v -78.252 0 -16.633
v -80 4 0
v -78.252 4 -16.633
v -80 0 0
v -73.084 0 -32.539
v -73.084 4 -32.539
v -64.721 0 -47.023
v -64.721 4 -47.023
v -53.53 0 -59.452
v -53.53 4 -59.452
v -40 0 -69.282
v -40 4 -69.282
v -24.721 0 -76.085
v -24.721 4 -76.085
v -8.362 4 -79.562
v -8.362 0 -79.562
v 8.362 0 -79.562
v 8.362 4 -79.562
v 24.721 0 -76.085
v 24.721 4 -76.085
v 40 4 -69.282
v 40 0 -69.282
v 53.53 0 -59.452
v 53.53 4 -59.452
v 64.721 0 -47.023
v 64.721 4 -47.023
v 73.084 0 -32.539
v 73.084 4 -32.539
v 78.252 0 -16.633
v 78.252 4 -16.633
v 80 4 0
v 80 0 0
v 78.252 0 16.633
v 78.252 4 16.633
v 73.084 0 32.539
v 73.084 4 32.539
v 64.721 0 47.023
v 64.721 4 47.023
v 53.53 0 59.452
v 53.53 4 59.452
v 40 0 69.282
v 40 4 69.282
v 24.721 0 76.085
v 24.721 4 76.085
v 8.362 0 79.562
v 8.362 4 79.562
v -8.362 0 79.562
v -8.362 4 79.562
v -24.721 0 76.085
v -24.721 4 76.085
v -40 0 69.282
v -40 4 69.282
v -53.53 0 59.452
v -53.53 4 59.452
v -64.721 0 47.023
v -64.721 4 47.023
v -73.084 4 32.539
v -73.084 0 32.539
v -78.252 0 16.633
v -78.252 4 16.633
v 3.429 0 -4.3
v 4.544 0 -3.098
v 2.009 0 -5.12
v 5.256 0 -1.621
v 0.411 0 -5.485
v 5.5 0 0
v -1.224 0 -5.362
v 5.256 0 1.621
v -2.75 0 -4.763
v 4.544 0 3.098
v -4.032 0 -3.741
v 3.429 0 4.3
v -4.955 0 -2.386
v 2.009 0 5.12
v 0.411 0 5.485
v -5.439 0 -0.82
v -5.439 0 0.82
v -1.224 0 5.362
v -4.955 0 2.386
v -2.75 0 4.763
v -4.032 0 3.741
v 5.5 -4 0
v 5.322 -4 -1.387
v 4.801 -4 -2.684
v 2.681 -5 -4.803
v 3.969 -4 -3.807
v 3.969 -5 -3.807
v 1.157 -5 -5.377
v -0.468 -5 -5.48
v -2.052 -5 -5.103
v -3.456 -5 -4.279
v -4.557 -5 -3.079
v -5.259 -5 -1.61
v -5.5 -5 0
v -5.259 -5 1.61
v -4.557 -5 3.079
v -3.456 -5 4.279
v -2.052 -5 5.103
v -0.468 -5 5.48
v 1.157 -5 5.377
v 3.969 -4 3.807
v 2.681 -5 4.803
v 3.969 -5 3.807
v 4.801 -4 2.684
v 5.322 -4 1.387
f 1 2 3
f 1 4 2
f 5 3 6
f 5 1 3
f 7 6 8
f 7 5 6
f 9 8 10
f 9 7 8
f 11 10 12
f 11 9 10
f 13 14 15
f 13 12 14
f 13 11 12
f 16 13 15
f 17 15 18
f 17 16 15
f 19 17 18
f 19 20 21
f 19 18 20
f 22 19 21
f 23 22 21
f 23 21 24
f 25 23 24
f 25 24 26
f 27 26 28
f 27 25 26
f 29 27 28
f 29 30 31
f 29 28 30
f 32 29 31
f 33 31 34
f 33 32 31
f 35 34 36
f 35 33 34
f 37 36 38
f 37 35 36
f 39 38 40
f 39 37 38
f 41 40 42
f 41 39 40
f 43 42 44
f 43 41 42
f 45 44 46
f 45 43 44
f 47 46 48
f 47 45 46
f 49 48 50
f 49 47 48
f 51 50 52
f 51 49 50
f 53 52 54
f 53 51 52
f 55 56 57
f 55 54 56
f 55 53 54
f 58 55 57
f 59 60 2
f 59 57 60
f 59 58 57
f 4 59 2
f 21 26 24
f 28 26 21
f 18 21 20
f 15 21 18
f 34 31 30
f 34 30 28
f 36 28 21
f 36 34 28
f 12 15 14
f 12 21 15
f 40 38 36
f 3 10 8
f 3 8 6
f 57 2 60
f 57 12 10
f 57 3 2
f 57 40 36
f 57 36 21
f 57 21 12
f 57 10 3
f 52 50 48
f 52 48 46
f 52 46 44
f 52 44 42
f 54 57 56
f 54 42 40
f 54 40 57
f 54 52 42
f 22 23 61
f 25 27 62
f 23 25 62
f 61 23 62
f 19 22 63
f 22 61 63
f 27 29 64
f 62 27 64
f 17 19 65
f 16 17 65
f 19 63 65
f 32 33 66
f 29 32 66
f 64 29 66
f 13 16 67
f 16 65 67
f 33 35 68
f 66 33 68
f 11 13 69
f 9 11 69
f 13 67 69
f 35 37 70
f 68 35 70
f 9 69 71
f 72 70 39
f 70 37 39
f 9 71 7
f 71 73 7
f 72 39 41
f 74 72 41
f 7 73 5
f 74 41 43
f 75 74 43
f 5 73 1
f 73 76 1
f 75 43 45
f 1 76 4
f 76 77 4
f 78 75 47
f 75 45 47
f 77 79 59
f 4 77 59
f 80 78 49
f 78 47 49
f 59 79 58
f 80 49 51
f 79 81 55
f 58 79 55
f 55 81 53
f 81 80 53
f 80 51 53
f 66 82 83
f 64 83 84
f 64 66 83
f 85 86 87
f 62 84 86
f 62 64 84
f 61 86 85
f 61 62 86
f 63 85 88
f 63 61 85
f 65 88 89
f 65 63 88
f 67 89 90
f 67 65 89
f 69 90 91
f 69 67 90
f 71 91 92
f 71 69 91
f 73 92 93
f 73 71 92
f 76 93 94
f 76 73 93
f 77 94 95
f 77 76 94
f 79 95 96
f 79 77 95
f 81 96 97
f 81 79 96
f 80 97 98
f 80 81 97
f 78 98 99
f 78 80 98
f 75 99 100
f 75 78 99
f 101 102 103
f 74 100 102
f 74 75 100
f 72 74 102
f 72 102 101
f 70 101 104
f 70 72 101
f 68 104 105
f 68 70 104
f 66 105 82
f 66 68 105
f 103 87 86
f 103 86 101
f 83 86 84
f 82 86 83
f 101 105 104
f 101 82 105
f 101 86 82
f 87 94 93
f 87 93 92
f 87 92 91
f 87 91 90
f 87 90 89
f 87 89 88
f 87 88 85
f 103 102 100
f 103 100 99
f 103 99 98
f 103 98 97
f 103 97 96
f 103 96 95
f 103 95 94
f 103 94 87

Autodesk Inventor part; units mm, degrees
ref_plane "YZ Plane" through (0, 0, 0) normal (1, 0, 0) x (0, 1, 0)
ref_plane "XZ Plane" through (0, 0, 0) normal (0, 1, 0) x (-1, 0, 0)
ref_plane "XY Plane" through (0, 0, 0) normal (0, 0, 1) x (1, 0, 0)
sketch "Sketch1" plane through (0, 0, 0) normal (0, 1, 0) x (-1, 0, 0)
  circle A0 centre (0, 0) radius 80
  dimension "d0" = 160
extrude "Extrusion1" add sketch "Sketch1" along normal blind 4
sketch "Sketch2" plane through (0, 0, 0) normal (0, -1, 0) x (1, 0, 0)
  point P0 (0, 0)
sketch "Sketch4" plane through (0, 0, 0) normal (0, -1, 0) x (1, 0, 0)
  circle A0 centre (0, 0) radius 5.5
  dimension "d7" = 11
extrude "Extrusion3" add sketch "Sketch4" along normal blind 5
sketch "Sketch5" plane through (0, 0, 0) normal (0, -1, 0) x (1, 0, 0)
  point P0 (0, 0)
sketch "Sketch8" plane through (0, -5, 0) normal (0, -1, 0) x (1, 0, 0)
  line L0 (3.9692, 4.8706) -> (31.1403, 4.8706)
  line L1 (31.1403, 4.8706) -> (31.1403, -5.1294)
  line L2 (31.1403, -5.1294) -> (3.9692, -5.1294)
  line L3 (3.9692, -5.1294) -> (3.9692, 4.8706)
  point P0 (0, 0)
  dimension "d15" = 10
extrude "Extrusion5" cut sketch "Sketch8" against normal blind 1
equation "\"d0\" = diamteru"
equation "\"d1\" = grosime"
equation "\"diamteru\" = 160"
equation "\"grosime\" = 4"
properties part number "pat" material "PET Plastic"
